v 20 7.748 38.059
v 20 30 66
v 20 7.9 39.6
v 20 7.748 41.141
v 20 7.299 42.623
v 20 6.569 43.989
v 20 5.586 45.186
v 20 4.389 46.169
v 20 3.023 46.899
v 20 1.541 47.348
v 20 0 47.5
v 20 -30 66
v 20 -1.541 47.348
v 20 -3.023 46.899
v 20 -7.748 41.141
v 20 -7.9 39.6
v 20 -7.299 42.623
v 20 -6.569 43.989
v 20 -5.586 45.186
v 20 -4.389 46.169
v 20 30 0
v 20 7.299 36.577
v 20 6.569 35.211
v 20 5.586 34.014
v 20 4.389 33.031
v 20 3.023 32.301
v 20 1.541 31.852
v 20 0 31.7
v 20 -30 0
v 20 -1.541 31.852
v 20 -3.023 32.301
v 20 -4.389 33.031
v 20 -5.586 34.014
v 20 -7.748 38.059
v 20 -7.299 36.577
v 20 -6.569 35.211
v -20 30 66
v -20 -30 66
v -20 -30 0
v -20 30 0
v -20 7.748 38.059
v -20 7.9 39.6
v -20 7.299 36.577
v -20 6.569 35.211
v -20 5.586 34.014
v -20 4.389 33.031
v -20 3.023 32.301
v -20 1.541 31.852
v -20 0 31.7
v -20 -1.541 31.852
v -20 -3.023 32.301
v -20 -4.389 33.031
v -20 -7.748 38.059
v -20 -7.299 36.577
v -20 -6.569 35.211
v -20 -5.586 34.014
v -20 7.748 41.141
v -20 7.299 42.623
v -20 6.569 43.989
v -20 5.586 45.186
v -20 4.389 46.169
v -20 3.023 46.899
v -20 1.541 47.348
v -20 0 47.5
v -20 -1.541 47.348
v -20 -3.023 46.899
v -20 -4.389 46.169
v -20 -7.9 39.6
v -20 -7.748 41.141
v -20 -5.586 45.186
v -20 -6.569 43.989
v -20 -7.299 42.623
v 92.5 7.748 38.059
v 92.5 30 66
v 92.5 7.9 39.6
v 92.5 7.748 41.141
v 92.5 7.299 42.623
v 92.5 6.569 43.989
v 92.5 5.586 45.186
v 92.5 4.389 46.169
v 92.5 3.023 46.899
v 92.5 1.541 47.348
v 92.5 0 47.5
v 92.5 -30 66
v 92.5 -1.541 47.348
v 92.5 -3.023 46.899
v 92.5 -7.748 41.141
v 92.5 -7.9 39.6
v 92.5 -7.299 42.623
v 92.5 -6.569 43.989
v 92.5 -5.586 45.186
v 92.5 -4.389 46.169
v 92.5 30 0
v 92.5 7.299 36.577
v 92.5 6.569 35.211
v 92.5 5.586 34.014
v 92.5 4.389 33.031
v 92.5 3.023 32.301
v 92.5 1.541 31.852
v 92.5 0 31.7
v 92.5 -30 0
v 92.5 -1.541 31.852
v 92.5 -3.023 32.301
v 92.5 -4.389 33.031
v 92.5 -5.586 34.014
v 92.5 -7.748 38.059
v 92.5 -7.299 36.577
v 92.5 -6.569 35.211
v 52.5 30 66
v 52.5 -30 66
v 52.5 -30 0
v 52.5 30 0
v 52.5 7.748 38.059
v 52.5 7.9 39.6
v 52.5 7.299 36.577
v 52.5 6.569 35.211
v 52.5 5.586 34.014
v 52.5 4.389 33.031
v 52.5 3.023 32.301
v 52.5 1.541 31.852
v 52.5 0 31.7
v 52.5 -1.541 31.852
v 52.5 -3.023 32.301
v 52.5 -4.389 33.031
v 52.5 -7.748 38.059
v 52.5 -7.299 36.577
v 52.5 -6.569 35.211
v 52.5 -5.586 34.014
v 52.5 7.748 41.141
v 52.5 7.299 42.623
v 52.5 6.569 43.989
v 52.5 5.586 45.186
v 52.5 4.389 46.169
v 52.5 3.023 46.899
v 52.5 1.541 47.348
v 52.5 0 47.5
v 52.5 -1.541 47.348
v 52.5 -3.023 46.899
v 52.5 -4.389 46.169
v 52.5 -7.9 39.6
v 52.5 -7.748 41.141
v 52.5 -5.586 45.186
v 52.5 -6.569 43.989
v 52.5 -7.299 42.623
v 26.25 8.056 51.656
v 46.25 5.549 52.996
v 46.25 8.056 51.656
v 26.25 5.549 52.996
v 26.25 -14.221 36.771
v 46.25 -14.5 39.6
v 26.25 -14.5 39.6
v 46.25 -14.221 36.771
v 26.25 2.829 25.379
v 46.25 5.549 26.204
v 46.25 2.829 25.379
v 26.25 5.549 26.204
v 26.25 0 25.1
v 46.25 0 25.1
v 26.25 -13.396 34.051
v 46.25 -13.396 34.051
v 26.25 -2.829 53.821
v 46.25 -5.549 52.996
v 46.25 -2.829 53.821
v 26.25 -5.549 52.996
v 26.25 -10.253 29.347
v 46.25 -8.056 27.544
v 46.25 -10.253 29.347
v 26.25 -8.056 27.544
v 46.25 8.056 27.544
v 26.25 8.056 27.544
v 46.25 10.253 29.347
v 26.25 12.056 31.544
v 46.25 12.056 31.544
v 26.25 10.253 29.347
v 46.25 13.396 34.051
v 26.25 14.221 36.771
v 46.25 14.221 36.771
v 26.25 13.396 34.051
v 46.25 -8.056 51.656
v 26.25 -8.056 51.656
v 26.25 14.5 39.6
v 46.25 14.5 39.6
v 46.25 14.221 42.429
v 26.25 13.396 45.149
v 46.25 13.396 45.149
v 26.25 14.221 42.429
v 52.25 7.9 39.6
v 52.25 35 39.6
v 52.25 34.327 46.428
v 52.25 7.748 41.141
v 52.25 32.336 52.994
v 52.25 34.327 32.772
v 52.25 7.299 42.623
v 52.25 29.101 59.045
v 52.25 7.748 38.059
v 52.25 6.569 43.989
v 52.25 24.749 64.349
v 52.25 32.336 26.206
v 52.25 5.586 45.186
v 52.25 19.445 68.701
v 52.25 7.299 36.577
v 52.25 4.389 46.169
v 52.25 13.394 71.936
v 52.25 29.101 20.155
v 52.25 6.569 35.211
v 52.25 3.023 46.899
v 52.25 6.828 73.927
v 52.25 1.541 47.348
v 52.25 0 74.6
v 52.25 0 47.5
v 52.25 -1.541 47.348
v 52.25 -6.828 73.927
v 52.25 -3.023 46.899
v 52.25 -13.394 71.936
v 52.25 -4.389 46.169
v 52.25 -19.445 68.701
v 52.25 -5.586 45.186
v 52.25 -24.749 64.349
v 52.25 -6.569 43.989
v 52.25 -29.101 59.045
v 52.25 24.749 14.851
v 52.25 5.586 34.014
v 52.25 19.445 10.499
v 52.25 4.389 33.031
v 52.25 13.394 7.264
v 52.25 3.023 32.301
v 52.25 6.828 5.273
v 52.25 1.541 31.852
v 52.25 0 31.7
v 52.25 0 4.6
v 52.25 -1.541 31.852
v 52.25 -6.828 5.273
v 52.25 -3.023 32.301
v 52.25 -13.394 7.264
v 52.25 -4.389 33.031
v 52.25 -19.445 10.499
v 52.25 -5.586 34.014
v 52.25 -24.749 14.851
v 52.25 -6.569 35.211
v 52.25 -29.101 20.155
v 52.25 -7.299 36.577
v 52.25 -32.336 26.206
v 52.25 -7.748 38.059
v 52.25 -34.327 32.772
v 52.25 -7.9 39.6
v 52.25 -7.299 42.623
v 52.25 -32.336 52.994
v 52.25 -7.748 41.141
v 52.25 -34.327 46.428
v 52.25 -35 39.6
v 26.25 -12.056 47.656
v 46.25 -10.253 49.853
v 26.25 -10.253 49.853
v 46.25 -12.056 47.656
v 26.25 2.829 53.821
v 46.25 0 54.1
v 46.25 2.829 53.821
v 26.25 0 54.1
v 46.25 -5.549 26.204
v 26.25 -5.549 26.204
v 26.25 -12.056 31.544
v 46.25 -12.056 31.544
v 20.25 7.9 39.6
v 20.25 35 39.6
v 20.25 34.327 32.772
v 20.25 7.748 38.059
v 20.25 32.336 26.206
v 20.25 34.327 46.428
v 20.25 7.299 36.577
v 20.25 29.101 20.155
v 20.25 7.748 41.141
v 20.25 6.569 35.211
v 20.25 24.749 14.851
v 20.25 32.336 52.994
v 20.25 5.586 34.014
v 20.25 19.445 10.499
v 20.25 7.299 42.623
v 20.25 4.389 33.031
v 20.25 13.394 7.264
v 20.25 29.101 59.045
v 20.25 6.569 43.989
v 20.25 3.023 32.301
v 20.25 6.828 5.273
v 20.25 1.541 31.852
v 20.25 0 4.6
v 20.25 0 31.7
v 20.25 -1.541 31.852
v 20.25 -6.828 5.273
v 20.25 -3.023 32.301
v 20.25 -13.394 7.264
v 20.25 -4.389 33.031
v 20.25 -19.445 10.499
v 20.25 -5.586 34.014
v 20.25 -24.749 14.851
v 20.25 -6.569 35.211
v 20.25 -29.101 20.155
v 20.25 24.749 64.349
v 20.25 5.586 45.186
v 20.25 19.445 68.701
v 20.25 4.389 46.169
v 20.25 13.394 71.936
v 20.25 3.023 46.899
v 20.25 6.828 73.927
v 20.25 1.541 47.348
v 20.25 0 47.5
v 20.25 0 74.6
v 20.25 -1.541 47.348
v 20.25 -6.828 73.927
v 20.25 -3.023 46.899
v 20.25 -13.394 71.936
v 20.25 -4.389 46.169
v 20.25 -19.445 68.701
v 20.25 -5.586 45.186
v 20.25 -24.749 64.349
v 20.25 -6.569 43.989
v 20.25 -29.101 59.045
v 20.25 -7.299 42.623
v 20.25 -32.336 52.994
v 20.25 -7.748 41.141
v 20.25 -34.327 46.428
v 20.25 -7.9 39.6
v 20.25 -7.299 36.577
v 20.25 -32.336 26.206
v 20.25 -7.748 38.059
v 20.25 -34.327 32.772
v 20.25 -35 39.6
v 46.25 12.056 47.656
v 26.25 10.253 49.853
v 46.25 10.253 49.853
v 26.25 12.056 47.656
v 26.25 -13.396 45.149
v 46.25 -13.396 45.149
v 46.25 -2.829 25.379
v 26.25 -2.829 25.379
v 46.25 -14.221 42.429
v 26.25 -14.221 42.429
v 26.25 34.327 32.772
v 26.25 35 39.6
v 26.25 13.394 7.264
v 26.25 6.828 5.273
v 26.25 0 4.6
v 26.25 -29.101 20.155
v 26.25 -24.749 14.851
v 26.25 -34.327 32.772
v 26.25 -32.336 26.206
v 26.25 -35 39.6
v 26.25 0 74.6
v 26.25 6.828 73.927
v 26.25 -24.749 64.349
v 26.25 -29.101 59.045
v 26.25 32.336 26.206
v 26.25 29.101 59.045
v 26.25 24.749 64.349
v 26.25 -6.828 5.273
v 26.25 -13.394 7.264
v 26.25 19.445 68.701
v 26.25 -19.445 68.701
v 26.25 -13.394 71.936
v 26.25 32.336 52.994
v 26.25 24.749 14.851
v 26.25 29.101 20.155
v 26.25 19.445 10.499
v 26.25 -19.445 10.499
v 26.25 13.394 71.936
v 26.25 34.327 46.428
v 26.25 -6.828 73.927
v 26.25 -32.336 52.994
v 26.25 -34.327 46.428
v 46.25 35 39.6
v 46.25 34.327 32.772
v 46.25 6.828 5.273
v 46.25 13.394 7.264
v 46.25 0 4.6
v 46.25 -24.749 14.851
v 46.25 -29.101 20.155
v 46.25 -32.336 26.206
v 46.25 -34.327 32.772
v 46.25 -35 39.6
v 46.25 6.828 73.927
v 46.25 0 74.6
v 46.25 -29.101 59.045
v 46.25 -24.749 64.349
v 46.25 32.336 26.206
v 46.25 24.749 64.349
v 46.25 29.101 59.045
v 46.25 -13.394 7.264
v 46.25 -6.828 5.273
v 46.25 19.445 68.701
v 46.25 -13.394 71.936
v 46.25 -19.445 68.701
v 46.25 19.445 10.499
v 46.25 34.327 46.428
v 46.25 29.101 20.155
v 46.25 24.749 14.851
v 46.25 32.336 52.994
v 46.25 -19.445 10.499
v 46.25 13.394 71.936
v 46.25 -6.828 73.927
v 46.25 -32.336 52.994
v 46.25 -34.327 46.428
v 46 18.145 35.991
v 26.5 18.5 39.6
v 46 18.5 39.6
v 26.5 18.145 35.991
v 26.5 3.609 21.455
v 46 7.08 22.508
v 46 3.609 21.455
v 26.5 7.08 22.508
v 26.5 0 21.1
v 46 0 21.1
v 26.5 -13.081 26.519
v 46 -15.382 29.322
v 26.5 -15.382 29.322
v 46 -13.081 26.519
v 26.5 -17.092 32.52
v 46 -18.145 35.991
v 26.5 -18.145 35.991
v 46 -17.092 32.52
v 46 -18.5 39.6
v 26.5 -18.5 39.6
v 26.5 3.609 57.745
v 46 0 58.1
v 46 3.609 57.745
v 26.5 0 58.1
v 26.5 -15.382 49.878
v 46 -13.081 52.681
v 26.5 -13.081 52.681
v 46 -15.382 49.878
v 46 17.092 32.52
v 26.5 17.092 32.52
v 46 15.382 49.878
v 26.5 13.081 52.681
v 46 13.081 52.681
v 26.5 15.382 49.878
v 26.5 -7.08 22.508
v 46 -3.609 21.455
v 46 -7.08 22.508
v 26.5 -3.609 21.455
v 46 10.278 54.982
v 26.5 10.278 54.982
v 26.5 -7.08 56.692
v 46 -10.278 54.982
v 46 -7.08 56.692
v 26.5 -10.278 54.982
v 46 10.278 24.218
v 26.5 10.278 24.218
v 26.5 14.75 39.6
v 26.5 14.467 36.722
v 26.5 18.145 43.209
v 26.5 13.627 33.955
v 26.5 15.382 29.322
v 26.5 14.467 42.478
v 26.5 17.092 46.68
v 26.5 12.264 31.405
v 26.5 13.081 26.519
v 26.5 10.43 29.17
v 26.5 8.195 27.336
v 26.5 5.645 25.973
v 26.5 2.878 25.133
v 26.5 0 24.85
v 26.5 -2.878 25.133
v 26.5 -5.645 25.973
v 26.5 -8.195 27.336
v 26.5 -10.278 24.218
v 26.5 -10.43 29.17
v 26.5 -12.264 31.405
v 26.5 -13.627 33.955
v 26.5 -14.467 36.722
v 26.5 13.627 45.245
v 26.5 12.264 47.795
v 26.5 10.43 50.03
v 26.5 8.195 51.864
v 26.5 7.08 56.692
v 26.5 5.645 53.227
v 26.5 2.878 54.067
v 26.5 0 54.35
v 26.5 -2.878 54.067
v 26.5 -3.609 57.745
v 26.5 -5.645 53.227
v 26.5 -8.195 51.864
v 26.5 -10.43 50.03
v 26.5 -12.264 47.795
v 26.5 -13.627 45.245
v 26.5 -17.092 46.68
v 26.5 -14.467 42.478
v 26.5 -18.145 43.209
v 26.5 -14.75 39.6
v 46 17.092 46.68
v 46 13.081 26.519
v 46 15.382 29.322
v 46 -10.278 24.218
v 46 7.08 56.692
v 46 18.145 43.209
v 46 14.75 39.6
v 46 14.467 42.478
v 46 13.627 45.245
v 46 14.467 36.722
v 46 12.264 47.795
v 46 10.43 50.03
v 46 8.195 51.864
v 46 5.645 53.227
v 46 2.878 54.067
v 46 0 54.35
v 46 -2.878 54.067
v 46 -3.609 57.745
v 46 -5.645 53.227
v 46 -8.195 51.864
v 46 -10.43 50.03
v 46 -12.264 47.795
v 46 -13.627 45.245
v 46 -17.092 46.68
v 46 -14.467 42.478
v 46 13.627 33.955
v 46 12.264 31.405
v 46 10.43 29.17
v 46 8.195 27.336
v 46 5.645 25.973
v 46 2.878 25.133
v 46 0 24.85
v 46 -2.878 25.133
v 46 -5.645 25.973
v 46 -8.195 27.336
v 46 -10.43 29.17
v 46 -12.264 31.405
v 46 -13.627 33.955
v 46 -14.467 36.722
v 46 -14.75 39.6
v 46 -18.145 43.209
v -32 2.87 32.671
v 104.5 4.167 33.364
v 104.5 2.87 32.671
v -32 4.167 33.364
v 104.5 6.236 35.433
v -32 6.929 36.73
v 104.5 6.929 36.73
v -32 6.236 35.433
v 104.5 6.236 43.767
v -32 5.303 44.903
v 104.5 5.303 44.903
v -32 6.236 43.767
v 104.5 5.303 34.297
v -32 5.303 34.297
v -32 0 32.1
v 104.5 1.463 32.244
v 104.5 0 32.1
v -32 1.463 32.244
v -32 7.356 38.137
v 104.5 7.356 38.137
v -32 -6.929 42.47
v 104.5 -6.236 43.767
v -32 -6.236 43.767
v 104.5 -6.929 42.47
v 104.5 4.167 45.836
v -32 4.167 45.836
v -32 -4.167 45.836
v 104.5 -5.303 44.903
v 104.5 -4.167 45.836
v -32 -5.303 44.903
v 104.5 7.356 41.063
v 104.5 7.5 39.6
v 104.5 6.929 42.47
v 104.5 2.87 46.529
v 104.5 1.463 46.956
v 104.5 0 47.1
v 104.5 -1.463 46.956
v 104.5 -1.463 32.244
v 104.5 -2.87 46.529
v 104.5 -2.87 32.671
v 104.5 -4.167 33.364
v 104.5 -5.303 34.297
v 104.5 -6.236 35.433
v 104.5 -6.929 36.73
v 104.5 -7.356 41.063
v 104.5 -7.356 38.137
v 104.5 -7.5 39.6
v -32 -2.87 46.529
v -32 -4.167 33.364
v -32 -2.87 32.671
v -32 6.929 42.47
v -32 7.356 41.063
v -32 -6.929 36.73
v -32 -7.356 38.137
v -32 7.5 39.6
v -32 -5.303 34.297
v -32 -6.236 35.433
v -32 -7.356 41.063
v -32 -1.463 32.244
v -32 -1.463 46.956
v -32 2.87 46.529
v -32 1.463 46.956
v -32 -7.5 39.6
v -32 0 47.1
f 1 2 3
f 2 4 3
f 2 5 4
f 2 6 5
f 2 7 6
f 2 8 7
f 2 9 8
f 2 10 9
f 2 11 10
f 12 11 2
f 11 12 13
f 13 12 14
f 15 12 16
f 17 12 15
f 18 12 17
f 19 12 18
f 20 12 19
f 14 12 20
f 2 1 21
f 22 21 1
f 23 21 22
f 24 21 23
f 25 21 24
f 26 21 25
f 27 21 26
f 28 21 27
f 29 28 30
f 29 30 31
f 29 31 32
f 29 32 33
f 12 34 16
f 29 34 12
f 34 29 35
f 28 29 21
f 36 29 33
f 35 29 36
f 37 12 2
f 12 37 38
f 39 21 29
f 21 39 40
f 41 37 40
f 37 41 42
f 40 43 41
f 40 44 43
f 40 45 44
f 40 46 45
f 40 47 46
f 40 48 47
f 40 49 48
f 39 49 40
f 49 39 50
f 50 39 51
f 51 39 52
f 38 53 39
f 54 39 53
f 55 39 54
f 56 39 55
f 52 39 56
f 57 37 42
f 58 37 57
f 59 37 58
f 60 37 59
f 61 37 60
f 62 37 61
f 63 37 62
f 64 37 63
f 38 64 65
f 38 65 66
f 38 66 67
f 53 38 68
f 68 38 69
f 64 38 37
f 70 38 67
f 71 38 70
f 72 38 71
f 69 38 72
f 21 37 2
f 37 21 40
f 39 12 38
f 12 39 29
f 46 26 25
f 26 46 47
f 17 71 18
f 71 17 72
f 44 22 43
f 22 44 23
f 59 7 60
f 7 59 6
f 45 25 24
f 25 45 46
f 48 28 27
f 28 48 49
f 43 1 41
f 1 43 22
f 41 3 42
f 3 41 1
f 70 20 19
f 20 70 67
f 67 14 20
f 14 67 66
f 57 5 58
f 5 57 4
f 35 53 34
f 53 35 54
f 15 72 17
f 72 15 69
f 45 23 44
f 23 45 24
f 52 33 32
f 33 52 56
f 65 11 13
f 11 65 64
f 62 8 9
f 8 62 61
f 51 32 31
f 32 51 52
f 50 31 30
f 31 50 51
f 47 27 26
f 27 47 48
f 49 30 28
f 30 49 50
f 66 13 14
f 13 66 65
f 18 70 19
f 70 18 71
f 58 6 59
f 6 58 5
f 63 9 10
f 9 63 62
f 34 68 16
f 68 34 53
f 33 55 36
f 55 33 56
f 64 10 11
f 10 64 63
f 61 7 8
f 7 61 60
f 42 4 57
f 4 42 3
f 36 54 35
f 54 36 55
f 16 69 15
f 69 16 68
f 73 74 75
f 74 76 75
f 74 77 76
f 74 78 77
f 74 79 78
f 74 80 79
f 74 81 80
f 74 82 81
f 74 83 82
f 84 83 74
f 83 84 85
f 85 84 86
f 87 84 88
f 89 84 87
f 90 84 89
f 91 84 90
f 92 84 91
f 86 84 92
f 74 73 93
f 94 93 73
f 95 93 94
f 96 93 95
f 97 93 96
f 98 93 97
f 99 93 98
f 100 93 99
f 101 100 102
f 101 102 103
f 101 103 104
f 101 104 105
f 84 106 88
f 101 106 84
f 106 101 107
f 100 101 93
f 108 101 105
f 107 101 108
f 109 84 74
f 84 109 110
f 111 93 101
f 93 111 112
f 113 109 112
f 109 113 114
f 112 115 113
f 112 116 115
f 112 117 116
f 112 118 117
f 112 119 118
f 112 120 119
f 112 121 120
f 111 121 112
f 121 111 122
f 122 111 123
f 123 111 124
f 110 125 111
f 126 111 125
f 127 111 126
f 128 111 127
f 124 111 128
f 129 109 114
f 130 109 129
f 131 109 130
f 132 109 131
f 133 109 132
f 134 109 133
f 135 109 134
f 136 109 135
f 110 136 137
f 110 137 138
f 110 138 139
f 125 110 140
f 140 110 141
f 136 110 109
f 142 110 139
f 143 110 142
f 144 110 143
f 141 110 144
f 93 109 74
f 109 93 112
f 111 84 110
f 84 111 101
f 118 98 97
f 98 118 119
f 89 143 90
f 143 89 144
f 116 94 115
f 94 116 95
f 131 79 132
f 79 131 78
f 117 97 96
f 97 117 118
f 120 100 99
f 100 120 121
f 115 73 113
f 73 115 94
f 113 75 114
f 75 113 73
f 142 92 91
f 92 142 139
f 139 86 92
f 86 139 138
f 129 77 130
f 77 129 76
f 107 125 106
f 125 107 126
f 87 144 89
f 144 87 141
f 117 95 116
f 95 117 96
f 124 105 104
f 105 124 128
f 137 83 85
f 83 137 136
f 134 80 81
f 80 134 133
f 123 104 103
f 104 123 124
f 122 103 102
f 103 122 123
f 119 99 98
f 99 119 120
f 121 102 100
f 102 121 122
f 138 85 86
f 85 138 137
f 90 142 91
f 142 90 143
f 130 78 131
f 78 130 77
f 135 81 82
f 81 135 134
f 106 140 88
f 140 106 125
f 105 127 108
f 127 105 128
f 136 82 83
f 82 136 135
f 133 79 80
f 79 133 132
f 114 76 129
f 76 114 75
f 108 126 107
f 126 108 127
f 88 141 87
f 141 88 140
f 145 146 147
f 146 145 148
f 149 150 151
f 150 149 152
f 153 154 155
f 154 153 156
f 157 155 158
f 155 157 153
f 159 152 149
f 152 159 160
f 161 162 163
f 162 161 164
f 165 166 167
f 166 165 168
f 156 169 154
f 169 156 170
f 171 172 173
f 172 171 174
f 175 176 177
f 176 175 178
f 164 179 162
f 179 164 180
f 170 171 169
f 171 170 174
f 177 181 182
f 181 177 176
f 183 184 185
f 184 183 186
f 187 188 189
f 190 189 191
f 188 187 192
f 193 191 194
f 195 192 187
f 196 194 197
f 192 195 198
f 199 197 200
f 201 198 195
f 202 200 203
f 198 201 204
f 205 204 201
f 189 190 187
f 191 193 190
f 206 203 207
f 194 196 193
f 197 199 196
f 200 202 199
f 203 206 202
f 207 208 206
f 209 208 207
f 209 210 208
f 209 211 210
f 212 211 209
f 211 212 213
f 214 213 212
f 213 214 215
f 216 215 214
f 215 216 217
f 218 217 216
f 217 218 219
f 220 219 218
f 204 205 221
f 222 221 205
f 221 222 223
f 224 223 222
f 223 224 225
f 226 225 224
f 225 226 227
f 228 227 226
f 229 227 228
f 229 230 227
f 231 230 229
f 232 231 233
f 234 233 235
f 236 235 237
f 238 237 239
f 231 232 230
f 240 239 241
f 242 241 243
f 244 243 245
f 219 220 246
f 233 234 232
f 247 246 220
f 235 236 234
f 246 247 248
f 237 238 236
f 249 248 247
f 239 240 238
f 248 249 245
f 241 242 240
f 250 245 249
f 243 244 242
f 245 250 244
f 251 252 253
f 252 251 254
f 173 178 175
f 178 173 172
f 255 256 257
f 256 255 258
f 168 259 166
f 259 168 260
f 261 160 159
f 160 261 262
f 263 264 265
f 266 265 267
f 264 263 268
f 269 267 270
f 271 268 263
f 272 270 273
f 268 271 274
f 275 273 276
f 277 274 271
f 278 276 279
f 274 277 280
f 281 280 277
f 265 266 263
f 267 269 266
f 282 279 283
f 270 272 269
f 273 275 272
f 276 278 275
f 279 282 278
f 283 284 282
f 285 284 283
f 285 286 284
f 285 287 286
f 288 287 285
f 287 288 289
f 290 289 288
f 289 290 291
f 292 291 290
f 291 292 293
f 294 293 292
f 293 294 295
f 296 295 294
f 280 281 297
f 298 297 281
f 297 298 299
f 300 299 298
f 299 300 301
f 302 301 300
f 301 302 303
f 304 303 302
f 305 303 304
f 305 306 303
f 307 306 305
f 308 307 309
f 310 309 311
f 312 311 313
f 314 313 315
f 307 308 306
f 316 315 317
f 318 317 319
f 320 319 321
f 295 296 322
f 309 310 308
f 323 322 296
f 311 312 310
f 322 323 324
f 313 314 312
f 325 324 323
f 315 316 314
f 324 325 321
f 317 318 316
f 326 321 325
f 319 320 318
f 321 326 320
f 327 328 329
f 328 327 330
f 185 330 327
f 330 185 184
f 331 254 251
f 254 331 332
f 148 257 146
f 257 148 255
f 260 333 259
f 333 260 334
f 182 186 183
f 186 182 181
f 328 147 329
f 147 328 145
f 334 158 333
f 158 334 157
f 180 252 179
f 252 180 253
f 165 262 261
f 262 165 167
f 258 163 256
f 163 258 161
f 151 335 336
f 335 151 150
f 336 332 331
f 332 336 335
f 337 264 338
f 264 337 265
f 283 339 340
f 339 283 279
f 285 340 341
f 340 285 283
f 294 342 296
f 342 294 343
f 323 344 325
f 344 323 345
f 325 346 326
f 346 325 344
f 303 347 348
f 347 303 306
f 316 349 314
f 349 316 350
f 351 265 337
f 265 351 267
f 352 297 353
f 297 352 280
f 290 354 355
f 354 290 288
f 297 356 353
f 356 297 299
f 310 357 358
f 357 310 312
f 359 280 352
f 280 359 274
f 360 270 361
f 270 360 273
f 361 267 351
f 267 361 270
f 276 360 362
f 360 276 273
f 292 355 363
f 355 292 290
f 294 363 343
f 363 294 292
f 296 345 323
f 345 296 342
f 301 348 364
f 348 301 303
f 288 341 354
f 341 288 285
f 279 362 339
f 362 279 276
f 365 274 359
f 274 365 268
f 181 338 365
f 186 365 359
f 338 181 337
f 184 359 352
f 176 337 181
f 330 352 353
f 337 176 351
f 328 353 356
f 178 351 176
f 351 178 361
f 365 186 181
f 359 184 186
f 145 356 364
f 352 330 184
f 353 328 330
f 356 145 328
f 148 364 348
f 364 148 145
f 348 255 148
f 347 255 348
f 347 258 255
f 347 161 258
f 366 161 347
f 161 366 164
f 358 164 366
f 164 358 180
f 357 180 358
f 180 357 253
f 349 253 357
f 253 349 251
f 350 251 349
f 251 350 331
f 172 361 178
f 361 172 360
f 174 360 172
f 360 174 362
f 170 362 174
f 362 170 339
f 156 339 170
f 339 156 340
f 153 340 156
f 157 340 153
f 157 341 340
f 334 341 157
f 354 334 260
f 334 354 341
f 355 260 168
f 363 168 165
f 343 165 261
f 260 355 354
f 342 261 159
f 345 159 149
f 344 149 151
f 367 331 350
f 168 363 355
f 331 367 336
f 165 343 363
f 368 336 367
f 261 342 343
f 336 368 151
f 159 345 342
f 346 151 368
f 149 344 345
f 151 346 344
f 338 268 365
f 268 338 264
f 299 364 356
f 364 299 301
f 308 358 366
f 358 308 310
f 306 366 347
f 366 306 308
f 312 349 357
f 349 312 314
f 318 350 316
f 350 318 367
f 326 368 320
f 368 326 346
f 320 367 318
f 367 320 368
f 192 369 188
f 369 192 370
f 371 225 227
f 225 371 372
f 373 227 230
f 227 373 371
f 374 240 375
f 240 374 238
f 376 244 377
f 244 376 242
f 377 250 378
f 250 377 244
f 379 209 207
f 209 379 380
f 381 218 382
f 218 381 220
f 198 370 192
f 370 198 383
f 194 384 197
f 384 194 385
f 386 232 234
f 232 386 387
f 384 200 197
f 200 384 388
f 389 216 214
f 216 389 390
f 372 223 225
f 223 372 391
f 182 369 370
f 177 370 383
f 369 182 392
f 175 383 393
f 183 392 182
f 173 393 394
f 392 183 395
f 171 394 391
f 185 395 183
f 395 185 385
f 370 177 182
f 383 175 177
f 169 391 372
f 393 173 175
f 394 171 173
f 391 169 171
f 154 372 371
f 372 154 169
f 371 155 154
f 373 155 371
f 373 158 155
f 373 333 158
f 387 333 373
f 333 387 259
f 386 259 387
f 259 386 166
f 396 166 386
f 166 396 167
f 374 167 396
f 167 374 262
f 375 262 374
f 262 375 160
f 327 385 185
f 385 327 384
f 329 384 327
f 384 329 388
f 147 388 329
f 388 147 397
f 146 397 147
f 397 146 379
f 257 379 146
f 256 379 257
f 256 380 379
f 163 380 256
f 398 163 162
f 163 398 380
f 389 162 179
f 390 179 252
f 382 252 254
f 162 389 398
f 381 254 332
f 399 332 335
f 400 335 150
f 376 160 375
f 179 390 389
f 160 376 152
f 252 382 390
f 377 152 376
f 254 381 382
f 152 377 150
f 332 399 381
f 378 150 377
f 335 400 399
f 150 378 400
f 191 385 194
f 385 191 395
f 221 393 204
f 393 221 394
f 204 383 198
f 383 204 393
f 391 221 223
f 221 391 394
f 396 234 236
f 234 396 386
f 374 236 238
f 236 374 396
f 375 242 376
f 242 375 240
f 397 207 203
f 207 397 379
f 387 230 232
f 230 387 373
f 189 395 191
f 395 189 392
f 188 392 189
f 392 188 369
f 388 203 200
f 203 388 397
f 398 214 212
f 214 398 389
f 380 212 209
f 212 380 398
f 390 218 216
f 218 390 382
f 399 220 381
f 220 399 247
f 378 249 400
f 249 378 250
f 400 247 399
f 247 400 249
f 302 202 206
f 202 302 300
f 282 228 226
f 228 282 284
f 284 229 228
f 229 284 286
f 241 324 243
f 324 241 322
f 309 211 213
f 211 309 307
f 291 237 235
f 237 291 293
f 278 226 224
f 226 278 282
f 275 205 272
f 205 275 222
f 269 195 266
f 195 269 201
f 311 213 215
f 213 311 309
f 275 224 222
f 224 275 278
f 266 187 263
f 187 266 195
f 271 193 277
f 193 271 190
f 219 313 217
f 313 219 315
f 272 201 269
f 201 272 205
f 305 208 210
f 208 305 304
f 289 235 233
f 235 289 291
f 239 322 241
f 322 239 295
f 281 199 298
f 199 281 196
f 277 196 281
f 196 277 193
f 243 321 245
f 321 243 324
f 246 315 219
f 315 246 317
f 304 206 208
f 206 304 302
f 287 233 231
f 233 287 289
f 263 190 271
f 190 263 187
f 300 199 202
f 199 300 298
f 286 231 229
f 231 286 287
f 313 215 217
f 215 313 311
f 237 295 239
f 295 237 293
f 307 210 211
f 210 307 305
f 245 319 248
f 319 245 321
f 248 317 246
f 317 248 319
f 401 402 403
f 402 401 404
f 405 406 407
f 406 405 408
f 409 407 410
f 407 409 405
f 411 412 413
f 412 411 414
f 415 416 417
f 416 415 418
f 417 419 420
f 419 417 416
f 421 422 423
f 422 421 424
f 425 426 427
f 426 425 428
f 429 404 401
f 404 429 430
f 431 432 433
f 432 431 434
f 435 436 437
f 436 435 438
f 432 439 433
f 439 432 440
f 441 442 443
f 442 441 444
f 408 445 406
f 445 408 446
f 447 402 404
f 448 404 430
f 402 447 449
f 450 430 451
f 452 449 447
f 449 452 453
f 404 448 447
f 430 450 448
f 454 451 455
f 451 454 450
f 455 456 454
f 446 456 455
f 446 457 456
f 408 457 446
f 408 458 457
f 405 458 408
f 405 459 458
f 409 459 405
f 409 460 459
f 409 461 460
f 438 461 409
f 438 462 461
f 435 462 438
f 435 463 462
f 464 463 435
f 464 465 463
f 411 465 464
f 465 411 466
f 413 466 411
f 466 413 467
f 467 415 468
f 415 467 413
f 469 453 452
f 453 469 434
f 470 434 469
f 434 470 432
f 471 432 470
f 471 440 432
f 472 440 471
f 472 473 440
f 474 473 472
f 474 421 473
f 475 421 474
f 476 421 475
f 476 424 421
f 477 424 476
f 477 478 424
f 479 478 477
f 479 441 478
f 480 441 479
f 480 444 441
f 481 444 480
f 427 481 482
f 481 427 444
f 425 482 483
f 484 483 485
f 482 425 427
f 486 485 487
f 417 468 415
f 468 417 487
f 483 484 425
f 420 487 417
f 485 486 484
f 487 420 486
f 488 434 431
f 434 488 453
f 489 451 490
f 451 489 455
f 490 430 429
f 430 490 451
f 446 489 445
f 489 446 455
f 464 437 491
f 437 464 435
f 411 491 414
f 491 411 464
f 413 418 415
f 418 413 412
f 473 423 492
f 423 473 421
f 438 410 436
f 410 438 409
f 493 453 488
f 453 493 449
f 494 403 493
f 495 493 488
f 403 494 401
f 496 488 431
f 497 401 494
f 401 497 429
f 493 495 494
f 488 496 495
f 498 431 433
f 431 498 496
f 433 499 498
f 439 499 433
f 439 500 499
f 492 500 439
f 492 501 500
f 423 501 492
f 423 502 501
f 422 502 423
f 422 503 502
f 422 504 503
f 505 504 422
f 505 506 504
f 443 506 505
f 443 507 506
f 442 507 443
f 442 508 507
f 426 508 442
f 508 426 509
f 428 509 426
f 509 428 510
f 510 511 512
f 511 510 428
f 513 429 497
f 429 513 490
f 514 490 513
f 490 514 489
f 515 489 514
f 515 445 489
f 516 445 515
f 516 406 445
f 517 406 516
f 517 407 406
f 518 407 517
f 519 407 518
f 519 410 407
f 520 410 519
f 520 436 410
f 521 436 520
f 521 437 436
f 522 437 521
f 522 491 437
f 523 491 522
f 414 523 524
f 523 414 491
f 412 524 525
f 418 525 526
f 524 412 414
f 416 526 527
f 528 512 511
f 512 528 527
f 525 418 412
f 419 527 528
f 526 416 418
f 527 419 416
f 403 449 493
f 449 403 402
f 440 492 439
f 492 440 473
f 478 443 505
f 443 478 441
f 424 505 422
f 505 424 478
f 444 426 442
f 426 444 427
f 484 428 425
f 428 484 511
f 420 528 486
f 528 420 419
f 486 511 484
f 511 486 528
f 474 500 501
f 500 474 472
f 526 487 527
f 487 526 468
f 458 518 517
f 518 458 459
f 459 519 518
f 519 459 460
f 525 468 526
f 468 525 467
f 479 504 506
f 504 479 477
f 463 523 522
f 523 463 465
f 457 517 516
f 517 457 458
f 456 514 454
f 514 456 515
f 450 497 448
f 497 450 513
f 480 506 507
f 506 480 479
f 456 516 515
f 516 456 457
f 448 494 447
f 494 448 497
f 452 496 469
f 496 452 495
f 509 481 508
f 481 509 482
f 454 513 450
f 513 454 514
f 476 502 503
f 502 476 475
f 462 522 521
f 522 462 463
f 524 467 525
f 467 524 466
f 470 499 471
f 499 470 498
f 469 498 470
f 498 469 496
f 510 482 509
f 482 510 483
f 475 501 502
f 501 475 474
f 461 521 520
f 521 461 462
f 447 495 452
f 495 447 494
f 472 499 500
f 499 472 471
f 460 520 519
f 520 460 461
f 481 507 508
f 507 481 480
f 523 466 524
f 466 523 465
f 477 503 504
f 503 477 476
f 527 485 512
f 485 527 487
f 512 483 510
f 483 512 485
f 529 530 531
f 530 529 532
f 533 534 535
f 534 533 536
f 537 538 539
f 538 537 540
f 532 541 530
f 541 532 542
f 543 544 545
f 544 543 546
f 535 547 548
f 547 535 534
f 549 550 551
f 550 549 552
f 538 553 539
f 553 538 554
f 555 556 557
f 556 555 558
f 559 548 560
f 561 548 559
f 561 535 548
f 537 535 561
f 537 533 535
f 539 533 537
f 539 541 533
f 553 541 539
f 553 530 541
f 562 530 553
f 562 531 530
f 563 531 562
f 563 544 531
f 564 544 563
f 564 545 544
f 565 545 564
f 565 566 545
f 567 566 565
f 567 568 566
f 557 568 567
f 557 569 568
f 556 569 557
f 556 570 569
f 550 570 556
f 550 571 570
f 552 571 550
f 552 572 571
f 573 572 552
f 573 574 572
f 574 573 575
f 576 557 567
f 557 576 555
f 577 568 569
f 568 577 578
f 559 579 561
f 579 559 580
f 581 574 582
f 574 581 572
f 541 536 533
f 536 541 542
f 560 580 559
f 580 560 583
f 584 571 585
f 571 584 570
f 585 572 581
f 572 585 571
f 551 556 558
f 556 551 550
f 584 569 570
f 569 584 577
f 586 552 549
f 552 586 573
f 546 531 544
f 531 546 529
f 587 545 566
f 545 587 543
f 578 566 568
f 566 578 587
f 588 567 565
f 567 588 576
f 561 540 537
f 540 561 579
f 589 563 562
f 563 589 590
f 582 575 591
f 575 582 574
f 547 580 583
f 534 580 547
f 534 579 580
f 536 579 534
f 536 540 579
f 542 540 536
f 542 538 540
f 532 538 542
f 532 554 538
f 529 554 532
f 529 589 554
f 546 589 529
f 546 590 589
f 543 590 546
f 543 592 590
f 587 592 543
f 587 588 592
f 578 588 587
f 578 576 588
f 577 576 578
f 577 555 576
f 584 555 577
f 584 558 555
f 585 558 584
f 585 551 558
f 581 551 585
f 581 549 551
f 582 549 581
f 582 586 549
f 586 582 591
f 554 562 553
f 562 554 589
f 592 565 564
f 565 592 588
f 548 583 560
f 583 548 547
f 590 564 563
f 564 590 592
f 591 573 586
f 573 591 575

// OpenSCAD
$fn = 32;

// ------------------------------------------------------------------------
// Pulley assembly: d70 pulley with a belt, shaft d15
// Every part is its own module, assembly() places them once.
// ------------------------------------------------------------------------

// --- part 1 ---
module support1() {
  difference() {
    translate([-20, -30, 0]) cube([40, 60, 66]);
    translate([0, 0, 39.6]) rotate([0, 90, 0]) cylinder(h = 42, d = 15.8, center = true);
  }
}

// --- part 2 ---
module support2() {
  difference() {
    translate([-20, -30, 0]) cube([40, 60, 66]);
    translate([0, 0, 39.6]) rotate([0, 90, 0]) cylinder(h = 42, d = 15.8, center = true);
  }
}

// --- part 3 ---
module shaft() {
  translate([0, 0, -68.25]) cylinder(h = 136.5, d = 15);
}

// --- part 4 ---
module pulley() {
  difference() {
    union() {
      cylinder(h = 32, d = 29);
      cylinder(h = 6, d = 70);
      translate([0, 0, 26]) cylinder(h = 6, d = 70);
    }
    translate([0, 0, -1]) cylinder(h = 34, d = 15.8);
  }
}

// --- part 5 ---
module belt() {
  difference() {
      translate([0, 0, 0]) cylinder(h = 19.5, d = 37);
      translate([0, 0, -1]) cylinder(h = 21.5, d = 29.5);
    }
}

// --- assembly ---
module assembly() {
  translate([0, 0, 0]) rotate([0, 0, 0]) support1();
  translate([72.5, 0, 0]) rotate([0, 0, 0]) support2();
  translate([36.25, 0, 39.6]) rotate([0, 90, 0]) shaft();
  translate([20.25, 0, 39.6]) rotate([0, 90, 0]) pulley();
  translate([26.5, 0, 39.6]) rotate([0, 90, 0]) belt();
}

assembly();
